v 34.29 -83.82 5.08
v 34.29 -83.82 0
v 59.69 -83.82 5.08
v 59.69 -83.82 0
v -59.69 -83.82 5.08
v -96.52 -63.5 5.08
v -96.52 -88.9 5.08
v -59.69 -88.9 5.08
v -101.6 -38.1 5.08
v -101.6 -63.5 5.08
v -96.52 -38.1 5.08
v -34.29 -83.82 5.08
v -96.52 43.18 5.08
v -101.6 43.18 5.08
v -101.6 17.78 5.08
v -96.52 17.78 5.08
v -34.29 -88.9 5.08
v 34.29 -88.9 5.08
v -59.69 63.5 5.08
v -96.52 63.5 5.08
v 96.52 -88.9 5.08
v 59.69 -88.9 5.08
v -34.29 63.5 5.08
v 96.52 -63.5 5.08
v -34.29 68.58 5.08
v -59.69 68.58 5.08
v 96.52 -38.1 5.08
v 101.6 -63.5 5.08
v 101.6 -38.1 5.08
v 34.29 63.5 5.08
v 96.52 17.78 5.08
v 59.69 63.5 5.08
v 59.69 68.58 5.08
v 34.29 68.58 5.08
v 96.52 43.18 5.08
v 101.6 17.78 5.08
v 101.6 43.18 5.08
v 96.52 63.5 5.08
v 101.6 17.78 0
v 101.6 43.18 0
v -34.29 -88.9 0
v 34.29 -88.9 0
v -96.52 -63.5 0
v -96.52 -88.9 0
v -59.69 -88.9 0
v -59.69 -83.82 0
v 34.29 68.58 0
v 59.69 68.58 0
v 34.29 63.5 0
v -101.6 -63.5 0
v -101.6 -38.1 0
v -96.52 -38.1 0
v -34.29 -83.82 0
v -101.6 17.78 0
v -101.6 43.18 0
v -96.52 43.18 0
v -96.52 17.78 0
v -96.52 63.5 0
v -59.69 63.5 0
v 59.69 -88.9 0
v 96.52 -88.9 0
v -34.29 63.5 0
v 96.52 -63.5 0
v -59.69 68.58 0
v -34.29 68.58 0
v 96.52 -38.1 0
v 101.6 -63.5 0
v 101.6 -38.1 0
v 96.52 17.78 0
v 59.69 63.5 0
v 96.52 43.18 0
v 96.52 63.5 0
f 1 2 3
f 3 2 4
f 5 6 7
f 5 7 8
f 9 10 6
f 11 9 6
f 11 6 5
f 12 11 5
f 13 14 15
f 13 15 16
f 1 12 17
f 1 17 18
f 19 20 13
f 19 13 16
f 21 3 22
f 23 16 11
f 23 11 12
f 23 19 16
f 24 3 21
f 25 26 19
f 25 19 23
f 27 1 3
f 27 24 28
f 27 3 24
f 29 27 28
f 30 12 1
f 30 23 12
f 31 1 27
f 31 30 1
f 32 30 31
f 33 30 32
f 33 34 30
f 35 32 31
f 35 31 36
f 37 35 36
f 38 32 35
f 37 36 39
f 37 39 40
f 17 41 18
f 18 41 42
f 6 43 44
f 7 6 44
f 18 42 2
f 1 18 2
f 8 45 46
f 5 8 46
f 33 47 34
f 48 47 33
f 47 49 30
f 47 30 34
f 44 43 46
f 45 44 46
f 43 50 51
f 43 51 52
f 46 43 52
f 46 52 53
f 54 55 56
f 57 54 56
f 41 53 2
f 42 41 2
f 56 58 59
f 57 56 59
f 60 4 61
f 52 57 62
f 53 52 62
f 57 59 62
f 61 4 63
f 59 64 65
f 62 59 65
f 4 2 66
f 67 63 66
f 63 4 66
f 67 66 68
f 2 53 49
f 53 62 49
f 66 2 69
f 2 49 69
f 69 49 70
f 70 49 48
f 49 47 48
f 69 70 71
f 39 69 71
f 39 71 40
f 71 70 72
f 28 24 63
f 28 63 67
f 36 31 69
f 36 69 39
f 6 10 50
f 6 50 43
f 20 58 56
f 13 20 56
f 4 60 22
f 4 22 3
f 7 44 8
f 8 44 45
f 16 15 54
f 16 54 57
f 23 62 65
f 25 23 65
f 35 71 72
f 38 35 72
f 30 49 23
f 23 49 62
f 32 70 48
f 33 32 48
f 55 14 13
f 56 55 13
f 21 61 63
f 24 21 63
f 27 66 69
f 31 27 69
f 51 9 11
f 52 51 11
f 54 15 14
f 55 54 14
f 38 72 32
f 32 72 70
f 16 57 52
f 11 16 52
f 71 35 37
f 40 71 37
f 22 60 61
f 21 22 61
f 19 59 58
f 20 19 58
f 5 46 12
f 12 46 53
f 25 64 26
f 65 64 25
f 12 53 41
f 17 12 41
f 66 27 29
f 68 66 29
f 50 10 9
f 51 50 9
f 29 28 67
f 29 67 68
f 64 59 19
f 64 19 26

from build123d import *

# Parameters (mm, degrees)
SKETCH1_W           = 36.83
SKETCH1_H           = 5.08
SKETCH1_W_2         = 25.4
BOSS_EXTRUDE1_DEPTH = 5.08
SKETCH2_W           = 5.08
SKETCH2_H           = 25.4
BOSS_EXTRUDE2_DEPTH = 5.08


with BuildPart() as part:
    # Sketch1 → Boss-Extrude1 (new body)
    with BuildSketch(Plane.XY):
        Polygon((59.69, -83.82), (96.52, -83.82), (96.52, 63.5), (59.69, 63.5), (34.29, 63.5), (-34.29, 63.5), (-59.69, 63.5), (-96.52, 63.5), (-96.52, -83.82), (-59.69, -83.82), (-34.29, -83.82), (-34.29, -88.9), (34.29, -88.9), (34.29, -83.82), align=None)
        with Locations((78.105, -86.36)):
            Rectangle(SKETCH1_W, SKETCH1_H)
        with Locations((-78.105, -86.36)):
            Rectangle(SKETCH1_W, SKETCH1_H)
        with Locations((46.99, 66.04)):
            Rectangle(SKETCH1_W_2, SKETCH1_H)
        with Locations((-46.99, 66.04)):
            Rectangle(SKETCH1_W_2, SKETCH1_H)
    extrude(amount=BOSS_EXTRUDE1_DEPTH)

    # Sketch2 → Boss-Extrude2 (add)
    with BuildSketch(Plane.XY.offset(5.08)):
        with Locations((99.06, -50.8)):
            Rectangle(SKETCH2_W, SKETCH2_H)
        with Locations((99.06, 30.48)):
            Rectangle(SKETCH2_W, SKETCH2_H)
        with Locations((-99.06, -50.8)):
            Rectangle(SKETCH2_W, SKETCH2_H)
        with Locations((-99.06, 30.48)):
            Rectangle(SKETCH2_W, SKETCH2_H)
    extrude(amount=-BOSS_EXTRUDE2_DEPTH)


solid = part.part
